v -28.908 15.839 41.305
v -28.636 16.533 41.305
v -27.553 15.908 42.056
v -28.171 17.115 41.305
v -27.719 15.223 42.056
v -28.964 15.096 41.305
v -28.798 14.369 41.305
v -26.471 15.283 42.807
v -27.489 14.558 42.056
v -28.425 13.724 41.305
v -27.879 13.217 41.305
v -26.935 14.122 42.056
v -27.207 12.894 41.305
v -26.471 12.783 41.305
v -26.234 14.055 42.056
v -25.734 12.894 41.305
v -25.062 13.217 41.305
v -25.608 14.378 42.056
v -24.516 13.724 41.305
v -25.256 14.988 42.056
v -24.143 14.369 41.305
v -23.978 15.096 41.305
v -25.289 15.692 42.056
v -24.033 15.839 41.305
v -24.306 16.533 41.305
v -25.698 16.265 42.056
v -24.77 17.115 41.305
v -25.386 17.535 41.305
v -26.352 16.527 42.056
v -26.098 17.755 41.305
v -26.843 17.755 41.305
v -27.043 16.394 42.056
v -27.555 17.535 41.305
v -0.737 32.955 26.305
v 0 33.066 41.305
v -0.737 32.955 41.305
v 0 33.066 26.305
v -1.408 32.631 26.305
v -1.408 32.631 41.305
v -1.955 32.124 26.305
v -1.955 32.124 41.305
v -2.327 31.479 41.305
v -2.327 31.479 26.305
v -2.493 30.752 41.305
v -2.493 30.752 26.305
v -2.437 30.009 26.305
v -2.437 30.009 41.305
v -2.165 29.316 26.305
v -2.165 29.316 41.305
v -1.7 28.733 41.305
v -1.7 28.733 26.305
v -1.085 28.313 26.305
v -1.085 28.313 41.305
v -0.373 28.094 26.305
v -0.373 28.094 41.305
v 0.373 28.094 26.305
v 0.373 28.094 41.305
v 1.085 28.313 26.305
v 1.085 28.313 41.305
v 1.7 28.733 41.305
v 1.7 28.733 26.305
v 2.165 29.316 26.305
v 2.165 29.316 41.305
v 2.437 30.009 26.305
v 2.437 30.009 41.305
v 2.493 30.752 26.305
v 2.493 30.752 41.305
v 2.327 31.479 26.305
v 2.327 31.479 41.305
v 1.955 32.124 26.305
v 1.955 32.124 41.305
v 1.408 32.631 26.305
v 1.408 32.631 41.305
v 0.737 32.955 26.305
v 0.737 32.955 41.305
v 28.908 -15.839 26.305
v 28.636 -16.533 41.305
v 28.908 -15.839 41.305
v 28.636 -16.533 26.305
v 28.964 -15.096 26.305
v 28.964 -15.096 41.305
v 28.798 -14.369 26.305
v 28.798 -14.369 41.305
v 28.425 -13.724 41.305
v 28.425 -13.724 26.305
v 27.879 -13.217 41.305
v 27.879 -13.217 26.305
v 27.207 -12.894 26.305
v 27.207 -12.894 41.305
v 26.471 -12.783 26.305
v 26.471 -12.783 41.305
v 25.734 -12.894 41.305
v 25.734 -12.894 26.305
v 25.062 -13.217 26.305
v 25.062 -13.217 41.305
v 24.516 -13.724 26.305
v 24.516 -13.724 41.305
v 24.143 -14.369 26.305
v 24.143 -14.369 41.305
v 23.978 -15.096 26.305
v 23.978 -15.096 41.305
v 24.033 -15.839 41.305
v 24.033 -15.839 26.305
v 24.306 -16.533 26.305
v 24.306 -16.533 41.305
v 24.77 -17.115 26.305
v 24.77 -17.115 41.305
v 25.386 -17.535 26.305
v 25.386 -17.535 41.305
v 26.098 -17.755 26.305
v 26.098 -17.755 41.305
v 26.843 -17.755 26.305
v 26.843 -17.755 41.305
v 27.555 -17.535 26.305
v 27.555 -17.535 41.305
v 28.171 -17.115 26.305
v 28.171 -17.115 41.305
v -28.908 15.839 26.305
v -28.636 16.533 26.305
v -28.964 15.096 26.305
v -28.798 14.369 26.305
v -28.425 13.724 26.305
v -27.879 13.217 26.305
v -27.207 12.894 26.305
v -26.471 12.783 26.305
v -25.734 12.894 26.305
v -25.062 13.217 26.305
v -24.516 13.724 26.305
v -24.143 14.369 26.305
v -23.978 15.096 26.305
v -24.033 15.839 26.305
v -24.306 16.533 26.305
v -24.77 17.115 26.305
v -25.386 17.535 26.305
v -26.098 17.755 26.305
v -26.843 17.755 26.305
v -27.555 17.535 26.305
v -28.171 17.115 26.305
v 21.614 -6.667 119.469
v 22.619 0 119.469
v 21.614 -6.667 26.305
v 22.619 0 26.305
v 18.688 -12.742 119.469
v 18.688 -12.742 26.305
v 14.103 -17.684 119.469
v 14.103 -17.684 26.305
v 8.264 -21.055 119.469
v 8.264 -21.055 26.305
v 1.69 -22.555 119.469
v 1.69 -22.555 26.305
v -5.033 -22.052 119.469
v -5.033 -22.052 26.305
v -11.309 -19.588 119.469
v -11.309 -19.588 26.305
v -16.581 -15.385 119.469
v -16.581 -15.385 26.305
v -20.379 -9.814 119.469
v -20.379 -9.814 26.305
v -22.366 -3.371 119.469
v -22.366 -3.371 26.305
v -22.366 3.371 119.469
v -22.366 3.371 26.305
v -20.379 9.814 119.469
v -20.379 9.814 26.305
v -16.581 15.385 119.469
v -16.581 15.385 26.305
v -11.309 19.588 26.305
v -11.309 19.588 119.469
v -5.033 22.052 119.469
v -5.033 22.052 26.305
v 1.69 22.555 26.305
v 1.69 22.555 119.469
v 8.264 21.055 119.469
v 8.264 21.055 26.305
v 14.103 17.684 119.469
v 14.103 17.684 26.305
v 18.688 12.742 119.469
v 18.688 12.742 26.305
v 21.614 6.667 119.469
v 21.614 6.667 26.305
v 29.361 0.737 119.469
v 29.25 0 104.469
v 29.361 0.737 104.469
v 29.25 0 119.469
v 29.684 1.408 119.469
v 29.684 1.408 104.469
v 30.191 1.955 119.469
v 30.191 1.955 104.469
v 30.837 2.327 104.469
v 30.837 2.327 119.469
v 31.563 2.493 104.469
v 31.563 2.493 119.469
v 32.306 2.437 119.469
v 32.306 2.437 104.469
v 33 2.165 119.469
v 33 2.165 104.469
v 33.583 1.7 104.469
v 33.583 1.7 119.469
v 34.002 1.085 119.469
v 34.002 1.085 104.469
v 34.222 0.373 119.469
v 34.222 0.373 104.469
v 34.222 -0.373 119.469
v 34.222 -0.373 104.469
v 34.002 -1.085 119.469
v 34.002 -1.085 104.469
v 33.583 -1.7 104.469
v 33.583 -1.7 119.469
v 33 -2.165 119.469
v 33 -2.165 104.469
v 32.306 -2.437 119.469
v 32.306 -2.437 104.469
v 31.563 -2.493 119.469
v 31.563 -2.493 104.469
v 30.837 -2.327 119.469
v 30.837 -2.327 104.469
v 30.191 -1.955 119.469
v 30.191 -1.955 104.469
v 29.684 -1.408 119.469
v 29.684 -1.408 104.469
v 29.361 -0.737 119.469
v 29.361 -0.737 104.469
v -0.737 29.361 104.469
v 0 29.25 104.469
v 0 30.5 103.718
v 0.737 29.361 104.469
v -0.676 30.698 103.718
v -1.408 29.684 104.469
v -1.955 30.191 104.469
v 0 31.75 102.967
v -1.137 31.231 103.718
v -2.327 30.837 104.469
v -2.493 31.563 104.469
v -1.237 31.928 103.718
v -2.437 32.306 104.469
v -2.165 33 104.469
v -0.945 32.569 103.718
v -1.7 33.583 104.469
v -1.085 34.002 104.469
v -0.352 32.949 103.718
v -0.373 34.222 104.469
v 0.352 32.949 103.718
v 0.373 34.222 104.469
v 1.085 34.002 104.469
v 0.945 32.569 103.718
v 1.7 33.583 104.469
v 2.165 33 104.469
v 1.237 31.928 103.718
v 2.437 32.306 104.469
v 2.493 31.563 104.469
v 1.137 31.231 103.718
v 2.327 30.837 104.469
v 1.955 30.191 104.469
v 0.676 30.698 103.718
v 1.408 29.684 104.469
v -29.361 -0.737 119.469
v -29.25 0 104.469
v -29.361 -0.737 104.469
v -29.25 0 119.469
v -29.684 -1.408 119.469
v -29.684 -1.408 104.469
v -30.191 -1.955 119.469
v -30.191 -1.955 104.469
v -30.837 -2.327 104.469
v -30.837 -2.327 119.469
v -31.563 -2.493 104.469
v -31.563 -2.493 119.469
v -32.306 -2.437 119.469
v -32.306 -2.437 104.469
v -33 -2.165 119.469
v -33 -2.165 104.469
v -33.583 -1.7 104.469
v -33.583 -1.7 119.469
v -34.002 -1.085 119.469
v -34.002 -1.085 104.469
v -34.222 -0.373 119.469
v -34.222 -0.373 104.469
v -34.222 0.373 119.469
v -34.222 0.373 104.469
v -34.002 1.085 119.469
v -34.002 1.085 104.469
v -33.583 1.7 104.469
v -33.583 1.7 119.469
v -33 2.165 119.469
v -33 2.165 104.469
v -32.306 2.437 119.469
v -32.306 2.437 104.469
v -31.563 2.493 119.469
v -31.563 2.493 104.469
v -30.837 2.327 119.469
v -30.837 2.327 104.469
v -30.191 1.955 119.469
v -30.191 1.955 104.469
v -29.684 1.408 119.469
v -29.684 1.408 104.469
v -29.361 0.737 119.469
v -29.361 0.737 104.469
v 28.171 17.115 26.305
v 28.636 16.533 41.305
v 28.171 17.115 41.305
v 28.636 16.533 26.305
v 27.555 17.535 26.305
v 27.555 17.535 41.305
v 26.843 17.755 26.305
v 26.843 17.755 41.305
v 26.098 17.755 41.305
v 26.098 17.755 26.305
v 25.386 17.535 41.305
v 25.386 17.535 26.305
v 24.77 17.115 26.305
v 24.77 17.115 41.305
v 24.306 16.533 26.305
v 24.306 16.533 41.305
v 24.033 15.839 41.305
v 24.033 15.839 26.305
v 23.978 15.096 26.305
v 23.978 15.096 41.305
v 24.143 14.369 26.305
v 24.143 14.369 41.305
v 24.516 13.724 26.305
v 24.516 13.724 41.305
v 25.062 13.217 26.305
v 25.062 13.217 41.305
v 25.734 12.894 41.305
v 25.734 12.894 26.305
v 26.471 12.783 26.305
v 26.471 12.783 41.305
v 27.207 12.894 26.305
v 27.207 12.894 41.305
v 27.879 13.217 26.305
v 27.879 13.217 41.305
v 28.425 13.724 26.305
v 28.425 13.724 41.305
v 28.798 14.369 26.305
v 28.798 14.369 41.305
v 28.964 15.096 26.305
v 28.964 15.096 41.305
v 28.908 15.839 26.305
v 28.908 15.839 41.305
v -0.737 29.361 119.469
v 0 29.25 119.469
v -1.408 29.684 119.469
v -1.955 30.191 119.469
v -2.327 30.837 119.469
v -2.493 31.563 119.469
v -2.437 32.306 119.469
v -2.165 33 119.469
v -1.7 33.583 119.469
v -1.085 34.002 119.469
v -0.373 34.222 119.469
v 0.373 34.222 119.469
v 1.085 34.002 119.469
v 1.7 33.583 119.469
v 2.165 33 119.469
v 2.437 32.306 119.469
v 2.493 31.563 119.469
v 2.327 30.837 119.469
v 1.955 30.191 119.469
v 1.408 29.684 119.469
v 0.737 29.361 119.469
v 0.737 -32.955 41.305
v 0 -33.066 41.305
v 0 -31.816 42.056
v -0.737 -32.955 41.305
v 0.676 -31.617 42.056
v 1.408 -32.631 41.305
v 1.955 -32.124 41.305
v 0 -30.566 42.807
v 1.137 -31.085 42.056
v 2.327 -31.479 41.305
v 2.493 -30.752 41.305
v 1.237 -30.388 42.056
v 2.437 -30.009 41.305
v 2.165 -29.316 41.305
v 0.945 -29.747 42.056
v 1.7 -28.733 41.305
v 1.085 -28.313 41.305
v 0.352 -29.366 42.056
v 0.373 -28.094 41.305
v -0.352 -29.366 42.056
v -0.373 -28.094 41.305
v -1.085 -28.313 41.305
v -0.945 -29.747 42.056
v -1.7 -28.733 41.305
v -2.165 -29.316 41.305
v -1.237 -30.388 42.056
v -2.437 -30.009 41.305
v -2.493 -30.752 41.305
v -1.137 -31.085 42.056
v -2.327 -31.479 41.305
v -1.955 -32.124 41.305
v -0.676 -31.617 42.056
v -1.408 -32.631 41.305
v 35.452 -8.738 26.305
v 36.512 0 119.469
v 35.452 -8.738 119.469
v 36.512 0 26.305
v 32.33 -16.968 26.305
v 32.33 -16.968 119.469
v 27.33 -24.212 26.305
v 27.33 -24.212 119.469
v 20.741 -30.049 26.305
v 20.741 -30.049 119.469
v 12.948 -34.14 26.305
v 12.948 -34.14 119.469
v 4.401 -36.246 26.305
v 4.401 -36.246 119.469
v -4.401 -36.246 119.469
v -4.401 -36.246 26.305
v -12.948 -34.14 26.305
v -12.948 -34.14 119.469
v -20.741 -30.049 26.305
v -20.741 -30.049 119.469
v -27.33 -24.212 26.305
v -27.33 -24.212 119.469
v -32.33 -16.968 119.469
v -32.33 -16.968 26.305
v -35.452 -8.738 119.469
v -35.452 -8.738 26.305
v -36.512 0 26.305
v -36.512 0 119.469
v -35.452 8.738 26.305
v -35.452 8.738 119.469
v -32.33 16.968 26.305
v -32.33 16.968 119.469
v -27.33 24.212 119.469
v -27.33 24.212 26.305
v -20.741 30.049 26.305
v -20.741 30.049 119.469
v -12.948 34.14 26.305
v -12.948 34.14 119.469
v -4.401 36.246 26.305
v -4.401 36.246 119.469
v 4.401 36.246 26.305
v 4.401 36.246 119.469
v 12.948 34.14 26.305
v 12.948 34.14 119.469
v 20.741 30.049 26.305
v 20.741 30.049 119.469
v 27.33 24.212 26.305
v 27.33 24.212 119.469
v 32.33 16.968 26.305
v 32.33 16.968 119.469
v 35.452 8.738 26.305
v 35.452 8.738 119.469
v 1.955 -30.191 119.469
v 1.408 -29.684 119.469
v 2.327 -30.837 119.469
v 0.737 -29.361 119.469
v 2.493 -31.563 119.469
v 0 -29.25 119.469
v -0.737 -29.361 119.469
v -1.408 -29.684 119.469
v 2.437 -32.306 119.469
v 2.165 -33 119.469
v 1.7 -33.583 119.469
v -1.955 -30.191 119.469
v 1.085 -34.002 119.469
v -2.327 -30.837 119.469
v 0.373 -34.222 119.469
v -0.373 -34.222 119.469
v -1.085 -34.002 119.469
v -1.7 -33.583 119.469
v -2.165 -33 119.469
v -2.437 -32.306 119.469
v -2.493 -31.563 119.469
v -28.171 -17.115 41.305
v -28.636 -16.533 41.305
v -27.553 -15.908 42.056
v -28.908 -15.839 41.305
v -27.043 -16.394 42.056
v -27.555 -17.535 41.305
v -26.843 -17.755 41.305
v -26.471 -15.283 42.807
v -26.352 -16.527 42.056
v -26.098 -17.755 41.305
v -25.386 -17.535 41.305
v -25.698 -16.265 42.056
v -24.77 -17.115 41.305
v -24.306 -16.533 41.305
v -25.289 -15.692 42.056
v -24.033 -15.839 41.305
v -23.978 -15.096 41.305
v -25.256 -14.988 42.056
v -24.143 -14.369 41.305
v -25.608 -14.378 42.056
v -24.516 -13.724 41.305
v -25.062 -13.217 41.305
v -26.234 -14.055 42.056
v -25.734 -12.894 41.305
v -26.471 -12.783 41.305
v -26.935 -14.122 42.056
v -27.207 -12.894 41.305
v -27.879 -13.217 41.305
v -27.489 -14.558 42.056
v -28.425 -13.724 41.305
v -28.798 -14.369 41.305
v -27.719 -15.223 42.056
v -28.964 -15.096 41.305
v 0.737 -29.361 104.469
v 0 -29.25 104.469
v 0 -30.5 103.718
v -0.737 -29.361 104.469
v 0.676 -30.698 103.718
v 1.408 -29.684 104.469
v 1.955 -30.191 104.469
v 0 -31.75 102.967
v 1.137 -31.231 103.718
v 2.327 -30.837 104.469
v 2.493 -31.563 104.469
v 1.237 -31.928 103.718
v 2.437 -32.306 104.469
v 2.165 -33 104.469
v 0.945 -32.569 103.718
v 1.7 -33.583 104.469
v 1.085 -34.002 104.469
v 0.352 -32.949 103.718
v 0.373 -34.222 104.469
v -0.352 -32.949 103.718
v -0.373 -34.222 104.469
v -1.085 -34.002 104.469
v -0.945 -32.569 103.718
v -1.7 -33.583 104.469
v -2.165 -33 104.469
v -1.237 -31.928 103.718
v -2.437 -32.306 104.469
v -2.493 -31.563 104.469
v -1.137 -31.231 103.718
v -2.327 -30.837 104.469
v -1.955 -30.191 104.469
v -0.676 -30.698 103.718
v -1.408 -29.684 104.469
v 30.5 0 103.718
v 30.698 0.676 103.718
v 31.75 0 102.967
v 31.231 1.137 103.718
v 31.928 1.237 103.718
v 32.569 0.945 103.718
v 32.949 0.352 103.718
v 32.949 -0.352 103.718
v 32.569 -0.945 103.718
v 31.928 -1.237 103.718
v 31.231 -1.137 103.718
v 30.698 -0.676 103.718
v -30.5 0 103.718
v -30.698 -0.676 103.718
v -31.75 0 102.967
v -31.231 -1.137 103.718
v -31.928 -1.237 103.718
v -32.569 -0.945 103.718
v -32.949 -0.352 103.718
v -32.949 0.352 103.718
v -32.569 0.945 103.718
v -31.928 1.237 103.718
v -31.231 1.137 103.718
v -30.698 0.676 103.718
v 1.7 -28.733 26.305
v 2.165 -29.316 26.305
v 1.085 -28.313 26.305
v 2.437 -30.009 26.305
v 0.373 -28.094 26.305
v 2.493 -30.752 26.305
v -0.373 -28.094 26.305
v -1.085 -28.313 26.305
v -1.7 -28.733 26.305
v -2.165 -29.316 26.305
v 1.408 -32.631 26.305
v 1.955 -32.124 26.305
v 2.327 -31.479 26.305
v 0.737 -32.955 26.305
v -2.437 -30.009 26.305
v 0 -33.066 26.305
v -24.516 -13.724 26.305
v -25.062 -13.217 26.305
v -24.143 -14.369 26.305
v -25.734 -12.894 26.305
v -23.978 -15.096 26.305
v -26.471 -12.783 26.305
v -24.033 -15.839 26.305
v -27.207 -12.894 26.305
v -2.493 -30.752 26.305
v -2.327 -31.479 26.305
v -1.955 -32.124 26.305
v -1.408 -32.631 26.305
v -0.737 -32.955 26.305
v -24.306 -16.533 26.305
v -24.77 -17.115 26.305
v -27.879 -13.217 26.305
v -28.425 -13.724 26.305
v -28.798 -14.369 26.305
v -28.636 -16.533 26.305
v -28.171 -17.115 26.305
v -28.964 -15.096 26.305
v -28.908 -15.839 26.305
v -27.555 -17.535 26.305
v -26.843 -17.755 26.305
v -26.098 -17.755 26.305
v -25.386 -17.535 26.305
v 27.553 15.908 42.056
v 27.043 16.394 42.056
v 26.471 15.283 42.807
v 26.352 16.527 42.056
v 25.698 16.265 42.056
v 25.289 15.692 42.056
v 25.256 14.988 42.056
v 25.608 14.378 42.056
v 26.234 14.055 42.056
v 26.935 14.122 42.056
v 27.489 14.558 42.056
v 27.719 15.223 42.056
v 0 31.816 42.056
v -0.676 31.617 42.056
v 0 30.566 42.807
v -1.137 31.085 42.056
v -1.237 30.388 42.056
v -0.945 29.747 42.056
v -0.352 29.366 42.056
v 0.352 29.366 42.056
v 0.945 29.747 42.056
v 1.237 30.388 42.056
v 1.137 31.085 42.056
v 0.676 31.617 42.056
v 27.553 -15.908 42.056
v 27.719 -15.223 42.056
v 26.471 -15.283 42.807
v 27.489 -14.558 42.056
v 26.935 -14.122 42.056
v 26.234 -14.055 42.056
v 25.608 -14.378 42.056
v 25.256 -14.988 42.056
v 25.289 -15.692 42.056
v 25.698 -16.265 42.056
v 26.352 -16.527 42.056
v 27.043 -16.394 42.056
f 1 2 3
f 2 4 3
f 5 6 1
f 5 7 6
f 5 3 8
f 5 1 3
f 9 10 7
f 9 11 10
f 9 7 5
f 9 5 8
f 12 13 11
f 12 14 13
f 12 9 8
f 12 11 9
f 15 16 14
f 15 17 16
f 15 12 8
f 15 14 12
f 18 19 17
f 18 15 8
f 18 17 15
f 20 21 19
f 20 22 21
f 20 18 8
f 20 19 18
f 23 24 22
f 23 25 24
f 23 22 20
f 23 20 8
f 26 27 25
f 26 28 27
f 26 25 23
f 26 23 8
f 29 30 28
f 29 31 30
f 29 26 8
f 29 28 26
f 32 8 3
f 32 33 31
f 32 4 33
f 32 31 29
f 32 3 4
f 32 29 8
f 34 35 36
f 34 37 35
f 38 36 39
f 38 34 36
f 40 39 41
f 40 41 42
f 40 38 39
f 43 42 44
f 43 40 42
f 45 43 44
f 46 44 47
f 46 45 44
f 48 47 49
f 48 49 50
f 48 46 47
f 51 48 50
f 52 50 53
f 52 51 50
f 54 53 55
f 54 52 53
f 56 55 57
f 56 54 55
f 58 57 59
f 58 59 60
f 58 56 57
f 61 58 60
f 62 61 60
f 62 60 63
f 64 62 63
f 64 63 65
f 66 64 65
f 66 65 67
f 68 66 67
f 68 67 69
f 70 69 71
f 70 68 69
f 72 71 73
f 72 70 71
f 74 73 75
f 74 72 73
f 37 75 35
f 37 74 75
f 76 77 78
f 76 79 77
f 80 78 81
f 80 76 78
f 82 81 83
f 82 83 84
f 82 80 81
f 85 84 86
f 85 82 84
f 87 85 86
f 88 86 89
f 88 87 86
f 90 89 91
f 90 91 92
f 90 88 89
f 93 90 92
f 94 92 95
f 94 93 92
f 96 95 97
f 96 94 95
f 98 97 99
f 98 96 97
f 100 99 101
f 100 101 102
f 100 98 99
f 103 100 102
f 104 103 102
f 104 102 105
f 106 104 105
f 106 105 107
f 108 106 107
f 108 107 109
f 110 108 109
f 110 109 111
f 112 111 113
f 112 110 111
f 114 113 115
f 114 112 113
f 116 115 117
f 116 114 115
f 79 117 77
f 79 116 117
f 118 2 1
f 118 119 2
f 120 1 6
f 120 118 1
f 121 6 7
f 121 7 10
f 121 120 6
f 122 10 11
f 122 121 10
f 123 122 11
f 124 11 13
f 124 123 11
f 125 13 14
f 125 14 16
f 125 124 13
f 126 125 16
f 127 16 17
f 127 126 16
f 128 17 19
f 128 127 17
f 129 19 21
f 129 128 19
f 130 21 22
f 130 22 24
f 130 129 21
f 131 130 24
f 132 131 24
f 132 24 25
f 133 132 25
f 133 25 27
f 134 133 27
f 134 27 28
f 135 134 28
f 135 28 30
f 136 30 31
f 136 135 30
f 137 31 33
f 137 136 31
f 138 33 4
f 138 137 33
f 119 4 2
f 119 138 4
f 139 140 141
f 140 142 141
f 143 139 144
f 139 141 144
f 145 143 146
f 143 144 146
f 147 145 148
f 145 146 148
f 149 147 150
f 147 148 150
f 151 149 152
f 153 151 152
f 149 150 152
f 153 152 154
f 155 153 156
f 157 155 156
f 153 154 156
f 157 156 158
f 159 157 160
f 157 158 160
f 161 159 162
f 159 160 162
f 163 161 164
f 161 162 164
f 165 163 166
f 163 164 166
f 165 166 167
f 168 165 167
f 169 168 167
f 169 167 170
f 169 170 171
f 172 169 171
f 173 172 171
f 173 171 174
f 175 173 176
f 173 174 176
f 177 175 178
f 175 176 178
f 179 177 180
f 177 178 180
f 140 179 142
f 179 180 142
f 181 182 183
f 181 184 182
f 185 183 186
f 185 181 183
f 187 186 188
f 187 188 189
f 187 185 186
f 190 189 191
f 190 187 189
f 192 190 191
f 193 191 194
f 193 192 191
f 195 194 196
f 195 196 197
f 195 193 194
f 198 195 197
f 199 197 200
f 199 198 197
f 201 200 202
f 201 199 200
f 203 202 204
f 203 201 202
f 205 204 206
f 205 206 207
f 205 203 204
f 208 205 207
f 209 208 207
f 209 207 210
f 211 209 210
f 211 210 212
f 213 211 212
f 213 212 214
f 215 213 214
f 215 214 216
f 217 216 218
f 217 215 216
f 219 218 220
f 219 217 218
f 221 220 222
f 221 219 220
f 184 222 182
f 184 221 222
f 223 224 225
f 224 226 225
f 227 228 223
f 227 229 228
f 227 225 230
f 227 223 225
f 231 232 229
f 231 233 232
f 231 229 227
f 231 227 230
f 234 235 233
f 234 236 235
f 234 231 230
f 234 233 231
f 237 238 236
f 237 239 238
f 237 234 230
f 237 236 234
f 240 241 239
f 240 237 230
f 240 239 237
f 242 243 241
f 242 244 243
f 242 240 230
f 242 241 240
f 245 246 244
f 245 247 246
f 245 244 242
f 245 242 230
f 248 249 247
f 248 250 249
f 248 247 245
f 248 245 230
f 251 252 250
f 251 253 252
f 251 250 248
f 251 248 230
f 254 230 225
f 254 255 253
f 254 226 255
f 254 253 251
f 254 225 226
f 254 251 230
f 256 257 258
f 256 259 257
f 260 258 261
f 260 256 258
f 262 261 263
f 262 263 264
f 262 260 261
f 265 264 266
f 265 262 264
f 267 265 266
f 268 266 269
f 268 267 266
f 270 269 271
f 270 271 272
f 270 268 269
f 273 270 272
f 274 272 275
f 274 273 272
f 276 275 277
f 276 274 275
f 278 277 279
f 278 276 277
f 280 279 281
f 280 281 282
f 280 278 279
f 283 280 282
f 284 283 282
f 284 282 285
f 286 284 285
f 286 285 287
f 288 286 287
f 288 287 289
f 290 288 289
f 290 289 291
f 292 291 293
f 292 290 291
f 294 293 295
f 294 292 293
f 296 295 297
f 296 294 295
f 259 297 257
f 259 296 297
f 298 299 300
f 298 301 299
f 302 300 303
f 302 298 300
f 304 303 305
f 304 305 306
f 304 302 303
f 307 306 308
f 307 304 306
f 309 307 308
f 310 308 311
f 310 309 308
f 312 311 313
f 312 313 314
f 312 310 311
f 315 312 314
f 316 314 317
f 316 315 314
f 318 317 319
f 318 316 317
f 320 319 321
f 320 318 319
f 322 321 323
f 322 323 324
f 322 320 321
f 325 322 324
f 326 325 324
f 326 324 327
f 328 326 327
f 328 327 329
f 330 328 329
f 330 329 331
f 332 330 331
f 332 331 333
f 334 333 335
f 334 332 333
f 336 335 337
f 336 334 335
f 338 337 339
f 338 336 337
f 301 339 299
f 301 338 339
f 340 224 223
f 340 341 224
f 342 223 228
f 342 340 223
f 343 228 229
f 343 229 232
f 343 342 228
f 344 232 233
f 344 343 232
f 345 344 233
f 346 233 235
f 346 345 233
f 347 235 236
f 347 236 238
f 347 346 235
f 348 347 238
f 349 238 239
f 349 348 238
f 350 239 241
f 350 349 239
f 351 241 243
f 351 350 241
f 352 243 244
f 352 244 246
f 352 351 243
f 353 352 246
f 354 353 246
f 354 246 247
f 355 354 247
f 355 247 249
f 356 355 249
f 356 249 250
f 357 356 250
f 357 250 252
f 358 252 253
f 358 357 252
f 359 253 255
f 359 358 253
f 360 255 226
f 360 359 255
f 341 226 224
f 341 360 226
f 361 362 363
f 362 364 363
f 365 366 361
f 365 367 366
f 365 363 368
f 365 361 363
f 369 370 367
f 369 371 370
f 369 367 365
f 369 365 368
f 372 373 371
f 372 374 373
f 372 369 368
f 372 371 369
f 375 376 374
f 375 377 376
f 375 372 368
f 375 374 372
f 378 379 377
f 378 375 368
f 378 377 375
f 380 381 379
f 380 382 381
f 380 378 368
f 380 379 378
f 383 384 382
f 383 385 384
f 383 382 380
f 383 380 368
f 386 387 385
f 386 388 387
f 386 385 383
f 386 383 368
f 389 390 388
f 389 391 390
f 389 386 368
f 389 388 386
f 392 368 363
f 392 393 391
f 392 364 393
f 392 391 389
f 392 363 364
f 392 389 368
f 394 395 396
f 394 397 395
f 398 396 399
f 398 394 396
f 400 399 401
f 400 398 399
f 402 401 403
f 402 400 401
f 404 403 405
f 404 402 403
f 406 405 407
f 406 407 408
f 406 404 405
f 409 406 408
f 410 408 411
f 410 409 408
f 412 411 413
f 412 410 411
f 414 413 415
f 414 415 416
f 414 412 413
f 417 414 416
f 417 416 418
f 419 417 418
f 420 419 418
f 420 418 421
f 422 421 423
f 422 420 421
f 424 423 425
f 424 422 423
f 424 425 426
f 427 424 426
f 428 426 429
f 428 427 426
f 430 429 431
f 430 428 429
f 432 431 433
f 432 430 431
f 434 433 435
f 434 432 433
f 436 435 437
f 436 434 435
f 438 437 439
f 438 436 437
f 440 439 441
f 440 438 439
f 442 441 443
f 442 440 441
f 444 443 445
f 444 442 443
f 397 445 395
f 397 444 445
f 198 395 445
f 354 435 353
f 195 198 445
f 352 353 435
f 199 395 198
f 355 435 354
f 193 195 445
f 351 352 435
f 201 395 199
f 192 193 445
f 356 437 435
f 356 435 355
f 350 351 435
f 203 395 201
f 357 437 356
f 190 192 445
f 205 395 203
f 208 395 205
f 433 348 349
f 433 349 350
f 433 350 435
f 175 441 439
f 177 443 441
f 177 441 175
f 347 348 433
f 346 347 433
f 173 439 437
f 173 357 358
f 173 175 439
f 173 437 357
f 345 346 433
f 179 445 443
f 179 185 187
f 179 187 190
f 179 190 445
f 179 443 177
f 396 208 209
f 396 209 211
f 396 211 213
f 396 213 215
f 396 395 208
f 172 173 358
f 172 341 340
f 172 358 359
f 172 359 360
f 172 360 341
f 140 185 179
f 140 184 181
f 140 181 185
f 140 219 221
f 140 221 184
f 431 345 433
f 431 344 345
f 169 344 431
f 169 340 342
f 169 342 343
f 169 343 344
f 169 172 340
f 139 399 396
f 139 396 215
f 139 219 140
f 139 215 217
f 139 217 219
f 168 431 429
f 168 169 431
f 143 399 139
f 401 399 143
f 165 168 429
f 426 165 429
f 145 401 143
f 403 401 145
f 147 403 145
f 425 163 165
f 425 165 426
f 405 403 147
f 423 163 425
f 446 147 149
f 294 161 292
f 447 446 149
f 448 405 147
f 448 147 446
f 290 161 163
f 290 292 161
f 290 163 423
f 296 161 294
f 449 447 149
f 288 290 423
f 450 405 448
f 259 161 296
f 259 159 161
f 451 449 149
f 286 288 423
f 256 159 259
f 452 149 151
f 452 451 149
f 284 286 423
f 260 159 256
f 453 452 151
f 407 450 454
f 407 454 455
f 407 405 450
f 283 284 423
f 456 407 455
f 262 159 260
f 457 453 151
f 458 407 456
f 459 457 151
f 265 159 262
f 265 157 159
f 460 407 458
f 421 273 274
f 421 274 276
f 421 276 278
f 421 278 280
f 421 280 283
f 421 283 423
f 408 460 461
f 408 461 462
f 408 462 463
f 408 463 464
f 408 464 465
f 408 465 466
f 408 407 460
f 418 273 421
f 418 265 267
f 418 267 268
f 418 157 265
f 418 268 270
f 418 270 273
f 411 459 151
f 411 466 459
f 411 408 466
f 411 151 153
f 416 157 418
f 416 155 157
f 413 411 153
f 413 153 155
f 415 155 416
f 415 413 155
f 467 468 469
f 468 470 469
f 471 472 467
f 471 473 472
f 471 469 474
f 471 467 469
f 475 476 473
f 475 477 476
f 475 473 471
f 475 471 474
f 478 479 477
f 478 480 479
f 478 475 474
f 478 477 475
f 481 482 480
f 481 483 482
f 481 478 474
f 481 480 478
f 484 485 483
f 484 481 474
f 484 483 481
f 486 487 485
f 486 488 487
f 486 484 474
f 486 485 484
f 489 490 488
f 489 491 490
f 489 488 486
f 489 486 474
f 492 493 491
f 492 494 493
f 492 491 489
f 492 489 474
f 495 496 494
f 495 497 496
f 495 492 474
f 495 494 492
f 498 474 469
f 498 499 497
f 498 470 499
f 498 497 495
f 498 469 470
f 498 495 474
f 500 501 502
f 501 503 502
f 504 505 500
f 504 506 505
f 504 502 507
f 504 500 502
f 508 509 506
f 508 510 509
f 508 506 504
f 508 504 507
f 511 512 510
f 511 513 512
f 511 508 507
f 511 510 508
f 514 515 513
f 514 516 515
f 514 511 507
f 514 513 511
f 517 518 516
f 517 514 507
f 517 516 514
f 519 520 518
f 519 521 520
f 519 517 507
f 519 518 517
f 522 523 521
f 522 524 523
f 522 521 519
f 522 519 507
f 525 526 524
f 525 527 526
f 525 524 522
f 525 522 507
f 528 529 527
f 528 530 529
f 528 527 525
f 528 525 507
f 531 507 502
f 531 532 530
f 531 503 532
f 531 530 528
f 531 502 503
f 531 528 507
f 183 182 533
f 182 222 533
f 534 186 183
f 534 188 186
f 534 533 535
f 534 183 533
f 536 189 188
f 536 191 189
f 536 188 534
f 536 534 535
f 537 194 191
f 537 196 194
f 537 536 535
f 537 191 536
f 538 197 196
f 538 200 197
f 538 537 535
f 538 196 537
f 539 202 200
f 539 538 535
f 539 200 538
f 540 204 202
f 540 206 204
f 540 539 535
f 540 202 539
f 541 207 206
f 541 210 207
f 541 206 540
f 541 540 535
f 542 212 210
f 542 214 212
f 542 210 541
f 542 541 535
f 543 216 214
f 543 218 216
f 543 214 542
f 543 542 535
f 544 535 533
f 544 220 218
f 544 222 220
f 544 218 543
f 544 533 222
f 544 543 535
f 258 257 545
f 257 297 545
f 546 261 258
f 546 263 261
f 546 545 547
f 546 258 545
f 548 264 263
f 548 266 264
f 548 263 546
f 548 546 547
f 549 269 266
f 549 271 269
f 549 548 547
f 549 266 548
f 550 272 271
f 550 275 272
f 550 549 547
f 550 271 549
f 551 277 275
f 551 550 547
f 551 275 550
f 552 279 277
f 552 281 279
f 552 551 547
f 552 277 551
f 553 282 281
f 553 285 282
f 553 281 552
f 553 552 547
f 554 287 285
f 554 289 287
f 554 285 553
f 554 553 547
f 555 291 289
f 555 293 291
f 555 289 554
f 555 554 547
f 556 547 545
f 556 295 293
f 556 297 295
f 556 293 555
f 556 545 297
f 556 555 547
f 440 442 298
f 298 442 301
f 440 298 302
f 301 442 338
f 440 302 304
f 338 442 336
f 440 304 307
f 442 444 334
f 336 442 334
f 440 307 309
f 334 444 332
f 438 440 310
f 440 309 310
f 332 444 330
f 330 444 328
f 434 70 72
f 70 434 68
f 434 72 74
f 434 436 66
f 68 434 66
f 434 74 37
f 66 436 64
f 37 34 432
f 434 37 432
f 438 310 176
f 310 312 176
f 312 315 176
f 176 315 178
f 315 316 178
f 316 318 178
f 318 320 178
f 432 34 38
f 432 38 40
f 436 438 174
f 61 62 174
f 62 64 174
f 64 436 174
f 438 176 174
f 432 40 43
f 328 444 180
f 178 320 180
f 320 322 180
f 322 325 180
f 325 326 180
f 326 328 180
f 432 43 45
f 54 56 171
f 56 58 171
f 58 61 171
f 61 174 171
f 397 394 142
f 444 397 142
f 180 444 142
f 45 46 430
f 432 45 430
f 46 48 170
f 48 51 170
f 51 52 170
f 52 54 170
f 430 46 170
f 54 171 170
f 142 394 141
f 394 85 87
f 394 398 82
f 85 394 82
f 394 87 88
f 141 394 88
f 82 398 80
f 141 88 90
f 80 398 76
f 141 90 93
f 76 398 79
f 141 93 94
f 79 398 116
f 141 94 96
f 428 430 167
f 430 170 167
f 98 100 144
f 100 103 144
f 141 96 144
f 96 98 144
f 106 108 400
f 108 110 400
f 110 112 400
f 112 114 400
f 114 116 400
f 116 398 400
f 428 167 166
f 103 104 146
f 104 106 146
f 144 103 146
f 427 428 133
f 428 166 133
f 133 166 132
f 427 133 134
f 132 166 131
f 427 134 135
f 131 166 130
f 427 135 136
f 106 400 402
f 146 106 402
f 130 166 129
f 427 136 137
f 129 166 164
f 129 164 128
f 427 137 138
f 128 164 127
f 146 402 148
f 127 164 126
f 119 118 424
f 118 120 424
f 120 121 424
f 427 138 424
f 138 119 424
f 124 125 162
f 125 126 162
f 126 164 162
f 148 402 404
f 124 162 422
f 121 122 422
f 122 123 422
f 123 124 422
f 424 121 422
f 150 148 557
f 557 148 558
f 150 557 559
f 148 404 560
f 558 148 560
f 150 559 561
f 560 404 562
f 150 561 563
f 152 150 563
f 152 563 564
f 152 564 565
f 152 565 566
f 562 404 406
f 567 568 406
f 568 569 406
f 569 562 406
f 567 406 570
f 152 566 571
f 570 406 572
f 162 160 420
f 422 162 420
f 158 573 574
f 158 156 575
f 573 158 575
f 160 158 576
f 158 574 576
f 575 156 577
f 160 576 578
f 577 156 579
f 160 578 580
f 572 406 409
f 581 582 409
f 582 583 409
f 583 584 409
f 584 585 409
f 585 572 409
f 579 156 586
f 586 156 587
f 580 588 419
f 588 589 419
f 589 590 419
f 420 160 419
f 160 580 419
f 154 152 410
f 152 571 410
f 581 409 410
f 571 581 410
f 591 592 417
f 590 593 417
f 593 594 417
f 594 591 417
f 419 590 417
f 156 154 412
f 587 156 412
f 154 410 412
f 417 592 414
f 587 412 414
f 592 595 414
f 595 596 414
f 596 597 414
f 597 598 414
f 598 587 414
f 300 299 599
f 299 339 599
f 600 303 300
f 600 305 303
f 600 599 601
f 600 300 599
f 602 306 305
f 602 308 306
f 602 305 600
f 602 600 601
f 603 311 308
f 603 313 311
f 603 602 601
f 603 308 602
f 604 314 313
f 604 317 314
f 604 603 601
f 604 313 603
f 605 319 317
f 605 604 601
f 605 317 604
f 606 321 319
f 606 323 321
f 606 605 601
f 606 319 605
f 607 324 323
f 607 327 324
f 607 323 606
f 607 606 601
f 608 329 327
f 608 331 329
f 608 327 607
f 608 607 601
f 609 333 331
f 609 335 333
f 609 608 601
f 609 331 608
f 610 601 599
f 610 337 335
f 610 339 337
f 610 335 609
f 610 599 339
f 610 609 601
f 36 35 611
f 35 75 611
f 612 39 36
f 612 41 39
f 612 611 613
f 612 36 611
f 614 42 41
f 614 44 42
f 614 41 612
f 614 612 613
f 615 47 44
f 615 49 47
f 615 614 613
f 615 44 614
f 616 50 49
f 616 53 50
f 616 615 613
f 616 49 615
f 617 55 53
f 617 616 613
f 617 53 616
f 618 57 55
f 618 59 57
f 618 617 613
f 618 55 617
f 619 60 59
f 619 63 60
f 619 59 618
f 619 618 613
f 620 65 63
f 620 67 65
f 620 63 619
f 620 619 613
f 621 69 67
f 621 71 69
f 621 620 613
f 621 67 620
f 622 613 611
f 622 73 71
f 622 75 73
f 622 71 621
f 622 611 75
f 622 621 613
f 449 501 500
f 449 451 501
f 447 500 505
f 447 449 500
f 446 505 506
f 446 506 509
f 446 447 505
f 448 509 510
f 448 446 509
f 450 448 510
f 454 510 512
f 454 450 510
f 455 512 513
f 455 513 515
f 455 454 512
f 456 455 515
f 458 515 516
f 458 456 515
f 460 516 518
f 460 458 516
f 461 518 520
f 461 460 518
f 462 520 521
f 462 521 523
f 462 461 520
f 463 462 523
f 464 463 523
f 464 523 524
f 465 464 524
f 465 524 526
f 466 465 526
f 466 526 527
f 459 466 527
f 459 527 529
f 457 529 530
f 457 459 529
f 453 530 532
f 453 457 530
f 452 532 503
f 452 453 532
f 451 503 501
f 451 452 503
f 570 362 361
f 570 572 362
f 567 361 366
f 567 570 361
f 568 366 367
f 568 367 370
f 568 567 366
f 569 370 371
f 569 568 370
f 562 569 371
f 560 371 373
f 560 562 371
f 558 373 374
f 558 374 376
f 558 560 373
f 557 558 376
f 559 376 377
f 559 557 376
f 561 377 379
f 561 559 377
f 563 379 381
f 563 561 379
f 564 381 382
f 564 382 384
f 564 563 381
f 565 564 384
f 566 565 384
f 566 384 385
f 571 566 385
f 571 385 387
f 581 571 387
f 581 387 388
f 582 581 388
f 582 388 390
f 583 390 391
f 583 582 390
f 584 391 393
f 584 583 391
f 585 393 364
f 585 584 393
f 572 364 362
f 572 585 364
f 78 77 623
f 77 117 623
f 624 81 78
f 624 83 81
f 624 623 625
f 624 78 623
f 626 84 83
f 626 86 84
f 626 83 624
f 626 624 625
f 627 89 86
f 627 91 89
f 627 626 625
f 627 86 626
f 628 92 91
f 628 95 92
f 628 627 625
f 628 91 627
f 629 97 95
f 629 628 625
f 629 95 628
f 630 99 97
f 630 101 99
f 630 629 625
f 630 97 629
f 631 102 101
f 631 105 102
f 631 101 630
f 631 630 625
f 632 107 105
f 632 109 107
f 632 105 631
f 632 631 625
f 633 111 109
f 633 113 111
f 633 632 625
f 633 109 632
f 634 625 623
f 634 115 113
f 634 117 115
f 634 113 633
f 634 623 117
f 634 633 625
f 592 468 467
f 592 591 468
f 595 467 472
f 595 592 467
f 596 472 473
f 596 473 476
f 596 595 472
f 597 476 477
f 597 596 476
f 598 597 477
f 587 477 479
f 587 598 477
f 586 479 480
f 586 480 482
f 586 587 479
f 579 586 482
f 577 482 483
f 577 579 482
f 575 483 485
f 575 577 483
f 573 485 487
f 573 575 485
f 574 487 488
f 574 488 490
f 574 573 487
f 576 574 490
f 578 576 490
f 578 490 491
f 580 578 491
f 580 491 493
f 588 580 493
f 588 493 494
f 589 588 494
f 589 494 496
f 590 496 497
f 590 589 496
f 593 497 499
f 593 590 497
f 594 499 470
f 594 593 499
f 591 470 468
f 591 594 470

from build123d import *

# Parameters (mm, degrees)
SKETCH1_W              = 93.16400014
SKETCH1_H              = 13.8938
BACKFACEPATTERN_COUNT  = 6
FRONTFACEPATTERN_COUNT = 4


with BuildPart() as part:
    # Sketch1 → Revolve1 (revolve)
    with BuildSketch(Plane(origin=(0, 0, 0), x_dir=(0, 0, -1), z_dir=(1, 0, 0)), mode=Mode.PRIVATE) as revolve1_sk:
        with Locations((-72.887000006, 29.5656)):
            Rectangle(SKETCH1_W, SKETCH1_H)
    revolve(revolve1_sk.sketch.rotate(Axis((0, 0, 119.469000076), (0, 0, -1)), 90), axis=Axis((0, 0, 119.469000076), (0, 0, -1)))

    # Sketch9 → M6x1.0 Tapped Hole3 (revolve, cut)
    with BuildSketch(Plane(origin=(0, 30.565600032, 26.304999936), x_dir=(0, 1, 0), z_dir=(1, 0, 0))):
        Polygon((0, 0), (0, 16.502151548), (2.5, 15), (2.5, 0), align=None)
    m6x1_0_tapped_hole3 = revolve(axis=Axis((0, 30.565600032, 19.954999936), (0, 0, 1)), mode=Mode.SUBTRACT)

    # BackFacePattern: M6x1.0 Tapped Hole3 ×6 about axis
    backfacepattern_axis = Axis((0, 0, 0), (0, 0, 1))
    for i in range(1, BACKFACEPATTERN_COUNT):
        add(m6x1_0_tapped_hole3.rotate(backfacepattern_axis, i * 360 / BACKFACEPATTERN_COUNT), mode=Mode.SUBTRACT)

    # Sketch6 → M6x1.0 Tapped Hole2 (revolve, cut)
    with BuildSketch(Plane(origin=(0, 31.75, 119.469000076), x_dir=(0, -1, 0), z_dir=(1, 0, 0))):
        Polygon((0, 0), (0, 16.502151548), (2.5, 15), (2.5, 0), align=None)
    m6x1_0_tapped_hole2 = revolve(axis=Axis((0, 31.75, 125.819000076), (0, 0, -1)), mode=Mode.SUBTRACT)

    # FrontFacePattern: M6x1.0 Tapped Hole2 ×4 about axis
    frontfacepattern_axis = Axis((0, 0, 0), (0, 0, 1))
    for i in range(1, FRONTFACEPATTERN_COUNT):
        add(m6x1_0_tapped_hole2.rotate(frontfacepattern_axis, i * 360 / FRONTFACEPATTERN_COUNT), mode=Mode.SUBTRACT)


solid = part.part
